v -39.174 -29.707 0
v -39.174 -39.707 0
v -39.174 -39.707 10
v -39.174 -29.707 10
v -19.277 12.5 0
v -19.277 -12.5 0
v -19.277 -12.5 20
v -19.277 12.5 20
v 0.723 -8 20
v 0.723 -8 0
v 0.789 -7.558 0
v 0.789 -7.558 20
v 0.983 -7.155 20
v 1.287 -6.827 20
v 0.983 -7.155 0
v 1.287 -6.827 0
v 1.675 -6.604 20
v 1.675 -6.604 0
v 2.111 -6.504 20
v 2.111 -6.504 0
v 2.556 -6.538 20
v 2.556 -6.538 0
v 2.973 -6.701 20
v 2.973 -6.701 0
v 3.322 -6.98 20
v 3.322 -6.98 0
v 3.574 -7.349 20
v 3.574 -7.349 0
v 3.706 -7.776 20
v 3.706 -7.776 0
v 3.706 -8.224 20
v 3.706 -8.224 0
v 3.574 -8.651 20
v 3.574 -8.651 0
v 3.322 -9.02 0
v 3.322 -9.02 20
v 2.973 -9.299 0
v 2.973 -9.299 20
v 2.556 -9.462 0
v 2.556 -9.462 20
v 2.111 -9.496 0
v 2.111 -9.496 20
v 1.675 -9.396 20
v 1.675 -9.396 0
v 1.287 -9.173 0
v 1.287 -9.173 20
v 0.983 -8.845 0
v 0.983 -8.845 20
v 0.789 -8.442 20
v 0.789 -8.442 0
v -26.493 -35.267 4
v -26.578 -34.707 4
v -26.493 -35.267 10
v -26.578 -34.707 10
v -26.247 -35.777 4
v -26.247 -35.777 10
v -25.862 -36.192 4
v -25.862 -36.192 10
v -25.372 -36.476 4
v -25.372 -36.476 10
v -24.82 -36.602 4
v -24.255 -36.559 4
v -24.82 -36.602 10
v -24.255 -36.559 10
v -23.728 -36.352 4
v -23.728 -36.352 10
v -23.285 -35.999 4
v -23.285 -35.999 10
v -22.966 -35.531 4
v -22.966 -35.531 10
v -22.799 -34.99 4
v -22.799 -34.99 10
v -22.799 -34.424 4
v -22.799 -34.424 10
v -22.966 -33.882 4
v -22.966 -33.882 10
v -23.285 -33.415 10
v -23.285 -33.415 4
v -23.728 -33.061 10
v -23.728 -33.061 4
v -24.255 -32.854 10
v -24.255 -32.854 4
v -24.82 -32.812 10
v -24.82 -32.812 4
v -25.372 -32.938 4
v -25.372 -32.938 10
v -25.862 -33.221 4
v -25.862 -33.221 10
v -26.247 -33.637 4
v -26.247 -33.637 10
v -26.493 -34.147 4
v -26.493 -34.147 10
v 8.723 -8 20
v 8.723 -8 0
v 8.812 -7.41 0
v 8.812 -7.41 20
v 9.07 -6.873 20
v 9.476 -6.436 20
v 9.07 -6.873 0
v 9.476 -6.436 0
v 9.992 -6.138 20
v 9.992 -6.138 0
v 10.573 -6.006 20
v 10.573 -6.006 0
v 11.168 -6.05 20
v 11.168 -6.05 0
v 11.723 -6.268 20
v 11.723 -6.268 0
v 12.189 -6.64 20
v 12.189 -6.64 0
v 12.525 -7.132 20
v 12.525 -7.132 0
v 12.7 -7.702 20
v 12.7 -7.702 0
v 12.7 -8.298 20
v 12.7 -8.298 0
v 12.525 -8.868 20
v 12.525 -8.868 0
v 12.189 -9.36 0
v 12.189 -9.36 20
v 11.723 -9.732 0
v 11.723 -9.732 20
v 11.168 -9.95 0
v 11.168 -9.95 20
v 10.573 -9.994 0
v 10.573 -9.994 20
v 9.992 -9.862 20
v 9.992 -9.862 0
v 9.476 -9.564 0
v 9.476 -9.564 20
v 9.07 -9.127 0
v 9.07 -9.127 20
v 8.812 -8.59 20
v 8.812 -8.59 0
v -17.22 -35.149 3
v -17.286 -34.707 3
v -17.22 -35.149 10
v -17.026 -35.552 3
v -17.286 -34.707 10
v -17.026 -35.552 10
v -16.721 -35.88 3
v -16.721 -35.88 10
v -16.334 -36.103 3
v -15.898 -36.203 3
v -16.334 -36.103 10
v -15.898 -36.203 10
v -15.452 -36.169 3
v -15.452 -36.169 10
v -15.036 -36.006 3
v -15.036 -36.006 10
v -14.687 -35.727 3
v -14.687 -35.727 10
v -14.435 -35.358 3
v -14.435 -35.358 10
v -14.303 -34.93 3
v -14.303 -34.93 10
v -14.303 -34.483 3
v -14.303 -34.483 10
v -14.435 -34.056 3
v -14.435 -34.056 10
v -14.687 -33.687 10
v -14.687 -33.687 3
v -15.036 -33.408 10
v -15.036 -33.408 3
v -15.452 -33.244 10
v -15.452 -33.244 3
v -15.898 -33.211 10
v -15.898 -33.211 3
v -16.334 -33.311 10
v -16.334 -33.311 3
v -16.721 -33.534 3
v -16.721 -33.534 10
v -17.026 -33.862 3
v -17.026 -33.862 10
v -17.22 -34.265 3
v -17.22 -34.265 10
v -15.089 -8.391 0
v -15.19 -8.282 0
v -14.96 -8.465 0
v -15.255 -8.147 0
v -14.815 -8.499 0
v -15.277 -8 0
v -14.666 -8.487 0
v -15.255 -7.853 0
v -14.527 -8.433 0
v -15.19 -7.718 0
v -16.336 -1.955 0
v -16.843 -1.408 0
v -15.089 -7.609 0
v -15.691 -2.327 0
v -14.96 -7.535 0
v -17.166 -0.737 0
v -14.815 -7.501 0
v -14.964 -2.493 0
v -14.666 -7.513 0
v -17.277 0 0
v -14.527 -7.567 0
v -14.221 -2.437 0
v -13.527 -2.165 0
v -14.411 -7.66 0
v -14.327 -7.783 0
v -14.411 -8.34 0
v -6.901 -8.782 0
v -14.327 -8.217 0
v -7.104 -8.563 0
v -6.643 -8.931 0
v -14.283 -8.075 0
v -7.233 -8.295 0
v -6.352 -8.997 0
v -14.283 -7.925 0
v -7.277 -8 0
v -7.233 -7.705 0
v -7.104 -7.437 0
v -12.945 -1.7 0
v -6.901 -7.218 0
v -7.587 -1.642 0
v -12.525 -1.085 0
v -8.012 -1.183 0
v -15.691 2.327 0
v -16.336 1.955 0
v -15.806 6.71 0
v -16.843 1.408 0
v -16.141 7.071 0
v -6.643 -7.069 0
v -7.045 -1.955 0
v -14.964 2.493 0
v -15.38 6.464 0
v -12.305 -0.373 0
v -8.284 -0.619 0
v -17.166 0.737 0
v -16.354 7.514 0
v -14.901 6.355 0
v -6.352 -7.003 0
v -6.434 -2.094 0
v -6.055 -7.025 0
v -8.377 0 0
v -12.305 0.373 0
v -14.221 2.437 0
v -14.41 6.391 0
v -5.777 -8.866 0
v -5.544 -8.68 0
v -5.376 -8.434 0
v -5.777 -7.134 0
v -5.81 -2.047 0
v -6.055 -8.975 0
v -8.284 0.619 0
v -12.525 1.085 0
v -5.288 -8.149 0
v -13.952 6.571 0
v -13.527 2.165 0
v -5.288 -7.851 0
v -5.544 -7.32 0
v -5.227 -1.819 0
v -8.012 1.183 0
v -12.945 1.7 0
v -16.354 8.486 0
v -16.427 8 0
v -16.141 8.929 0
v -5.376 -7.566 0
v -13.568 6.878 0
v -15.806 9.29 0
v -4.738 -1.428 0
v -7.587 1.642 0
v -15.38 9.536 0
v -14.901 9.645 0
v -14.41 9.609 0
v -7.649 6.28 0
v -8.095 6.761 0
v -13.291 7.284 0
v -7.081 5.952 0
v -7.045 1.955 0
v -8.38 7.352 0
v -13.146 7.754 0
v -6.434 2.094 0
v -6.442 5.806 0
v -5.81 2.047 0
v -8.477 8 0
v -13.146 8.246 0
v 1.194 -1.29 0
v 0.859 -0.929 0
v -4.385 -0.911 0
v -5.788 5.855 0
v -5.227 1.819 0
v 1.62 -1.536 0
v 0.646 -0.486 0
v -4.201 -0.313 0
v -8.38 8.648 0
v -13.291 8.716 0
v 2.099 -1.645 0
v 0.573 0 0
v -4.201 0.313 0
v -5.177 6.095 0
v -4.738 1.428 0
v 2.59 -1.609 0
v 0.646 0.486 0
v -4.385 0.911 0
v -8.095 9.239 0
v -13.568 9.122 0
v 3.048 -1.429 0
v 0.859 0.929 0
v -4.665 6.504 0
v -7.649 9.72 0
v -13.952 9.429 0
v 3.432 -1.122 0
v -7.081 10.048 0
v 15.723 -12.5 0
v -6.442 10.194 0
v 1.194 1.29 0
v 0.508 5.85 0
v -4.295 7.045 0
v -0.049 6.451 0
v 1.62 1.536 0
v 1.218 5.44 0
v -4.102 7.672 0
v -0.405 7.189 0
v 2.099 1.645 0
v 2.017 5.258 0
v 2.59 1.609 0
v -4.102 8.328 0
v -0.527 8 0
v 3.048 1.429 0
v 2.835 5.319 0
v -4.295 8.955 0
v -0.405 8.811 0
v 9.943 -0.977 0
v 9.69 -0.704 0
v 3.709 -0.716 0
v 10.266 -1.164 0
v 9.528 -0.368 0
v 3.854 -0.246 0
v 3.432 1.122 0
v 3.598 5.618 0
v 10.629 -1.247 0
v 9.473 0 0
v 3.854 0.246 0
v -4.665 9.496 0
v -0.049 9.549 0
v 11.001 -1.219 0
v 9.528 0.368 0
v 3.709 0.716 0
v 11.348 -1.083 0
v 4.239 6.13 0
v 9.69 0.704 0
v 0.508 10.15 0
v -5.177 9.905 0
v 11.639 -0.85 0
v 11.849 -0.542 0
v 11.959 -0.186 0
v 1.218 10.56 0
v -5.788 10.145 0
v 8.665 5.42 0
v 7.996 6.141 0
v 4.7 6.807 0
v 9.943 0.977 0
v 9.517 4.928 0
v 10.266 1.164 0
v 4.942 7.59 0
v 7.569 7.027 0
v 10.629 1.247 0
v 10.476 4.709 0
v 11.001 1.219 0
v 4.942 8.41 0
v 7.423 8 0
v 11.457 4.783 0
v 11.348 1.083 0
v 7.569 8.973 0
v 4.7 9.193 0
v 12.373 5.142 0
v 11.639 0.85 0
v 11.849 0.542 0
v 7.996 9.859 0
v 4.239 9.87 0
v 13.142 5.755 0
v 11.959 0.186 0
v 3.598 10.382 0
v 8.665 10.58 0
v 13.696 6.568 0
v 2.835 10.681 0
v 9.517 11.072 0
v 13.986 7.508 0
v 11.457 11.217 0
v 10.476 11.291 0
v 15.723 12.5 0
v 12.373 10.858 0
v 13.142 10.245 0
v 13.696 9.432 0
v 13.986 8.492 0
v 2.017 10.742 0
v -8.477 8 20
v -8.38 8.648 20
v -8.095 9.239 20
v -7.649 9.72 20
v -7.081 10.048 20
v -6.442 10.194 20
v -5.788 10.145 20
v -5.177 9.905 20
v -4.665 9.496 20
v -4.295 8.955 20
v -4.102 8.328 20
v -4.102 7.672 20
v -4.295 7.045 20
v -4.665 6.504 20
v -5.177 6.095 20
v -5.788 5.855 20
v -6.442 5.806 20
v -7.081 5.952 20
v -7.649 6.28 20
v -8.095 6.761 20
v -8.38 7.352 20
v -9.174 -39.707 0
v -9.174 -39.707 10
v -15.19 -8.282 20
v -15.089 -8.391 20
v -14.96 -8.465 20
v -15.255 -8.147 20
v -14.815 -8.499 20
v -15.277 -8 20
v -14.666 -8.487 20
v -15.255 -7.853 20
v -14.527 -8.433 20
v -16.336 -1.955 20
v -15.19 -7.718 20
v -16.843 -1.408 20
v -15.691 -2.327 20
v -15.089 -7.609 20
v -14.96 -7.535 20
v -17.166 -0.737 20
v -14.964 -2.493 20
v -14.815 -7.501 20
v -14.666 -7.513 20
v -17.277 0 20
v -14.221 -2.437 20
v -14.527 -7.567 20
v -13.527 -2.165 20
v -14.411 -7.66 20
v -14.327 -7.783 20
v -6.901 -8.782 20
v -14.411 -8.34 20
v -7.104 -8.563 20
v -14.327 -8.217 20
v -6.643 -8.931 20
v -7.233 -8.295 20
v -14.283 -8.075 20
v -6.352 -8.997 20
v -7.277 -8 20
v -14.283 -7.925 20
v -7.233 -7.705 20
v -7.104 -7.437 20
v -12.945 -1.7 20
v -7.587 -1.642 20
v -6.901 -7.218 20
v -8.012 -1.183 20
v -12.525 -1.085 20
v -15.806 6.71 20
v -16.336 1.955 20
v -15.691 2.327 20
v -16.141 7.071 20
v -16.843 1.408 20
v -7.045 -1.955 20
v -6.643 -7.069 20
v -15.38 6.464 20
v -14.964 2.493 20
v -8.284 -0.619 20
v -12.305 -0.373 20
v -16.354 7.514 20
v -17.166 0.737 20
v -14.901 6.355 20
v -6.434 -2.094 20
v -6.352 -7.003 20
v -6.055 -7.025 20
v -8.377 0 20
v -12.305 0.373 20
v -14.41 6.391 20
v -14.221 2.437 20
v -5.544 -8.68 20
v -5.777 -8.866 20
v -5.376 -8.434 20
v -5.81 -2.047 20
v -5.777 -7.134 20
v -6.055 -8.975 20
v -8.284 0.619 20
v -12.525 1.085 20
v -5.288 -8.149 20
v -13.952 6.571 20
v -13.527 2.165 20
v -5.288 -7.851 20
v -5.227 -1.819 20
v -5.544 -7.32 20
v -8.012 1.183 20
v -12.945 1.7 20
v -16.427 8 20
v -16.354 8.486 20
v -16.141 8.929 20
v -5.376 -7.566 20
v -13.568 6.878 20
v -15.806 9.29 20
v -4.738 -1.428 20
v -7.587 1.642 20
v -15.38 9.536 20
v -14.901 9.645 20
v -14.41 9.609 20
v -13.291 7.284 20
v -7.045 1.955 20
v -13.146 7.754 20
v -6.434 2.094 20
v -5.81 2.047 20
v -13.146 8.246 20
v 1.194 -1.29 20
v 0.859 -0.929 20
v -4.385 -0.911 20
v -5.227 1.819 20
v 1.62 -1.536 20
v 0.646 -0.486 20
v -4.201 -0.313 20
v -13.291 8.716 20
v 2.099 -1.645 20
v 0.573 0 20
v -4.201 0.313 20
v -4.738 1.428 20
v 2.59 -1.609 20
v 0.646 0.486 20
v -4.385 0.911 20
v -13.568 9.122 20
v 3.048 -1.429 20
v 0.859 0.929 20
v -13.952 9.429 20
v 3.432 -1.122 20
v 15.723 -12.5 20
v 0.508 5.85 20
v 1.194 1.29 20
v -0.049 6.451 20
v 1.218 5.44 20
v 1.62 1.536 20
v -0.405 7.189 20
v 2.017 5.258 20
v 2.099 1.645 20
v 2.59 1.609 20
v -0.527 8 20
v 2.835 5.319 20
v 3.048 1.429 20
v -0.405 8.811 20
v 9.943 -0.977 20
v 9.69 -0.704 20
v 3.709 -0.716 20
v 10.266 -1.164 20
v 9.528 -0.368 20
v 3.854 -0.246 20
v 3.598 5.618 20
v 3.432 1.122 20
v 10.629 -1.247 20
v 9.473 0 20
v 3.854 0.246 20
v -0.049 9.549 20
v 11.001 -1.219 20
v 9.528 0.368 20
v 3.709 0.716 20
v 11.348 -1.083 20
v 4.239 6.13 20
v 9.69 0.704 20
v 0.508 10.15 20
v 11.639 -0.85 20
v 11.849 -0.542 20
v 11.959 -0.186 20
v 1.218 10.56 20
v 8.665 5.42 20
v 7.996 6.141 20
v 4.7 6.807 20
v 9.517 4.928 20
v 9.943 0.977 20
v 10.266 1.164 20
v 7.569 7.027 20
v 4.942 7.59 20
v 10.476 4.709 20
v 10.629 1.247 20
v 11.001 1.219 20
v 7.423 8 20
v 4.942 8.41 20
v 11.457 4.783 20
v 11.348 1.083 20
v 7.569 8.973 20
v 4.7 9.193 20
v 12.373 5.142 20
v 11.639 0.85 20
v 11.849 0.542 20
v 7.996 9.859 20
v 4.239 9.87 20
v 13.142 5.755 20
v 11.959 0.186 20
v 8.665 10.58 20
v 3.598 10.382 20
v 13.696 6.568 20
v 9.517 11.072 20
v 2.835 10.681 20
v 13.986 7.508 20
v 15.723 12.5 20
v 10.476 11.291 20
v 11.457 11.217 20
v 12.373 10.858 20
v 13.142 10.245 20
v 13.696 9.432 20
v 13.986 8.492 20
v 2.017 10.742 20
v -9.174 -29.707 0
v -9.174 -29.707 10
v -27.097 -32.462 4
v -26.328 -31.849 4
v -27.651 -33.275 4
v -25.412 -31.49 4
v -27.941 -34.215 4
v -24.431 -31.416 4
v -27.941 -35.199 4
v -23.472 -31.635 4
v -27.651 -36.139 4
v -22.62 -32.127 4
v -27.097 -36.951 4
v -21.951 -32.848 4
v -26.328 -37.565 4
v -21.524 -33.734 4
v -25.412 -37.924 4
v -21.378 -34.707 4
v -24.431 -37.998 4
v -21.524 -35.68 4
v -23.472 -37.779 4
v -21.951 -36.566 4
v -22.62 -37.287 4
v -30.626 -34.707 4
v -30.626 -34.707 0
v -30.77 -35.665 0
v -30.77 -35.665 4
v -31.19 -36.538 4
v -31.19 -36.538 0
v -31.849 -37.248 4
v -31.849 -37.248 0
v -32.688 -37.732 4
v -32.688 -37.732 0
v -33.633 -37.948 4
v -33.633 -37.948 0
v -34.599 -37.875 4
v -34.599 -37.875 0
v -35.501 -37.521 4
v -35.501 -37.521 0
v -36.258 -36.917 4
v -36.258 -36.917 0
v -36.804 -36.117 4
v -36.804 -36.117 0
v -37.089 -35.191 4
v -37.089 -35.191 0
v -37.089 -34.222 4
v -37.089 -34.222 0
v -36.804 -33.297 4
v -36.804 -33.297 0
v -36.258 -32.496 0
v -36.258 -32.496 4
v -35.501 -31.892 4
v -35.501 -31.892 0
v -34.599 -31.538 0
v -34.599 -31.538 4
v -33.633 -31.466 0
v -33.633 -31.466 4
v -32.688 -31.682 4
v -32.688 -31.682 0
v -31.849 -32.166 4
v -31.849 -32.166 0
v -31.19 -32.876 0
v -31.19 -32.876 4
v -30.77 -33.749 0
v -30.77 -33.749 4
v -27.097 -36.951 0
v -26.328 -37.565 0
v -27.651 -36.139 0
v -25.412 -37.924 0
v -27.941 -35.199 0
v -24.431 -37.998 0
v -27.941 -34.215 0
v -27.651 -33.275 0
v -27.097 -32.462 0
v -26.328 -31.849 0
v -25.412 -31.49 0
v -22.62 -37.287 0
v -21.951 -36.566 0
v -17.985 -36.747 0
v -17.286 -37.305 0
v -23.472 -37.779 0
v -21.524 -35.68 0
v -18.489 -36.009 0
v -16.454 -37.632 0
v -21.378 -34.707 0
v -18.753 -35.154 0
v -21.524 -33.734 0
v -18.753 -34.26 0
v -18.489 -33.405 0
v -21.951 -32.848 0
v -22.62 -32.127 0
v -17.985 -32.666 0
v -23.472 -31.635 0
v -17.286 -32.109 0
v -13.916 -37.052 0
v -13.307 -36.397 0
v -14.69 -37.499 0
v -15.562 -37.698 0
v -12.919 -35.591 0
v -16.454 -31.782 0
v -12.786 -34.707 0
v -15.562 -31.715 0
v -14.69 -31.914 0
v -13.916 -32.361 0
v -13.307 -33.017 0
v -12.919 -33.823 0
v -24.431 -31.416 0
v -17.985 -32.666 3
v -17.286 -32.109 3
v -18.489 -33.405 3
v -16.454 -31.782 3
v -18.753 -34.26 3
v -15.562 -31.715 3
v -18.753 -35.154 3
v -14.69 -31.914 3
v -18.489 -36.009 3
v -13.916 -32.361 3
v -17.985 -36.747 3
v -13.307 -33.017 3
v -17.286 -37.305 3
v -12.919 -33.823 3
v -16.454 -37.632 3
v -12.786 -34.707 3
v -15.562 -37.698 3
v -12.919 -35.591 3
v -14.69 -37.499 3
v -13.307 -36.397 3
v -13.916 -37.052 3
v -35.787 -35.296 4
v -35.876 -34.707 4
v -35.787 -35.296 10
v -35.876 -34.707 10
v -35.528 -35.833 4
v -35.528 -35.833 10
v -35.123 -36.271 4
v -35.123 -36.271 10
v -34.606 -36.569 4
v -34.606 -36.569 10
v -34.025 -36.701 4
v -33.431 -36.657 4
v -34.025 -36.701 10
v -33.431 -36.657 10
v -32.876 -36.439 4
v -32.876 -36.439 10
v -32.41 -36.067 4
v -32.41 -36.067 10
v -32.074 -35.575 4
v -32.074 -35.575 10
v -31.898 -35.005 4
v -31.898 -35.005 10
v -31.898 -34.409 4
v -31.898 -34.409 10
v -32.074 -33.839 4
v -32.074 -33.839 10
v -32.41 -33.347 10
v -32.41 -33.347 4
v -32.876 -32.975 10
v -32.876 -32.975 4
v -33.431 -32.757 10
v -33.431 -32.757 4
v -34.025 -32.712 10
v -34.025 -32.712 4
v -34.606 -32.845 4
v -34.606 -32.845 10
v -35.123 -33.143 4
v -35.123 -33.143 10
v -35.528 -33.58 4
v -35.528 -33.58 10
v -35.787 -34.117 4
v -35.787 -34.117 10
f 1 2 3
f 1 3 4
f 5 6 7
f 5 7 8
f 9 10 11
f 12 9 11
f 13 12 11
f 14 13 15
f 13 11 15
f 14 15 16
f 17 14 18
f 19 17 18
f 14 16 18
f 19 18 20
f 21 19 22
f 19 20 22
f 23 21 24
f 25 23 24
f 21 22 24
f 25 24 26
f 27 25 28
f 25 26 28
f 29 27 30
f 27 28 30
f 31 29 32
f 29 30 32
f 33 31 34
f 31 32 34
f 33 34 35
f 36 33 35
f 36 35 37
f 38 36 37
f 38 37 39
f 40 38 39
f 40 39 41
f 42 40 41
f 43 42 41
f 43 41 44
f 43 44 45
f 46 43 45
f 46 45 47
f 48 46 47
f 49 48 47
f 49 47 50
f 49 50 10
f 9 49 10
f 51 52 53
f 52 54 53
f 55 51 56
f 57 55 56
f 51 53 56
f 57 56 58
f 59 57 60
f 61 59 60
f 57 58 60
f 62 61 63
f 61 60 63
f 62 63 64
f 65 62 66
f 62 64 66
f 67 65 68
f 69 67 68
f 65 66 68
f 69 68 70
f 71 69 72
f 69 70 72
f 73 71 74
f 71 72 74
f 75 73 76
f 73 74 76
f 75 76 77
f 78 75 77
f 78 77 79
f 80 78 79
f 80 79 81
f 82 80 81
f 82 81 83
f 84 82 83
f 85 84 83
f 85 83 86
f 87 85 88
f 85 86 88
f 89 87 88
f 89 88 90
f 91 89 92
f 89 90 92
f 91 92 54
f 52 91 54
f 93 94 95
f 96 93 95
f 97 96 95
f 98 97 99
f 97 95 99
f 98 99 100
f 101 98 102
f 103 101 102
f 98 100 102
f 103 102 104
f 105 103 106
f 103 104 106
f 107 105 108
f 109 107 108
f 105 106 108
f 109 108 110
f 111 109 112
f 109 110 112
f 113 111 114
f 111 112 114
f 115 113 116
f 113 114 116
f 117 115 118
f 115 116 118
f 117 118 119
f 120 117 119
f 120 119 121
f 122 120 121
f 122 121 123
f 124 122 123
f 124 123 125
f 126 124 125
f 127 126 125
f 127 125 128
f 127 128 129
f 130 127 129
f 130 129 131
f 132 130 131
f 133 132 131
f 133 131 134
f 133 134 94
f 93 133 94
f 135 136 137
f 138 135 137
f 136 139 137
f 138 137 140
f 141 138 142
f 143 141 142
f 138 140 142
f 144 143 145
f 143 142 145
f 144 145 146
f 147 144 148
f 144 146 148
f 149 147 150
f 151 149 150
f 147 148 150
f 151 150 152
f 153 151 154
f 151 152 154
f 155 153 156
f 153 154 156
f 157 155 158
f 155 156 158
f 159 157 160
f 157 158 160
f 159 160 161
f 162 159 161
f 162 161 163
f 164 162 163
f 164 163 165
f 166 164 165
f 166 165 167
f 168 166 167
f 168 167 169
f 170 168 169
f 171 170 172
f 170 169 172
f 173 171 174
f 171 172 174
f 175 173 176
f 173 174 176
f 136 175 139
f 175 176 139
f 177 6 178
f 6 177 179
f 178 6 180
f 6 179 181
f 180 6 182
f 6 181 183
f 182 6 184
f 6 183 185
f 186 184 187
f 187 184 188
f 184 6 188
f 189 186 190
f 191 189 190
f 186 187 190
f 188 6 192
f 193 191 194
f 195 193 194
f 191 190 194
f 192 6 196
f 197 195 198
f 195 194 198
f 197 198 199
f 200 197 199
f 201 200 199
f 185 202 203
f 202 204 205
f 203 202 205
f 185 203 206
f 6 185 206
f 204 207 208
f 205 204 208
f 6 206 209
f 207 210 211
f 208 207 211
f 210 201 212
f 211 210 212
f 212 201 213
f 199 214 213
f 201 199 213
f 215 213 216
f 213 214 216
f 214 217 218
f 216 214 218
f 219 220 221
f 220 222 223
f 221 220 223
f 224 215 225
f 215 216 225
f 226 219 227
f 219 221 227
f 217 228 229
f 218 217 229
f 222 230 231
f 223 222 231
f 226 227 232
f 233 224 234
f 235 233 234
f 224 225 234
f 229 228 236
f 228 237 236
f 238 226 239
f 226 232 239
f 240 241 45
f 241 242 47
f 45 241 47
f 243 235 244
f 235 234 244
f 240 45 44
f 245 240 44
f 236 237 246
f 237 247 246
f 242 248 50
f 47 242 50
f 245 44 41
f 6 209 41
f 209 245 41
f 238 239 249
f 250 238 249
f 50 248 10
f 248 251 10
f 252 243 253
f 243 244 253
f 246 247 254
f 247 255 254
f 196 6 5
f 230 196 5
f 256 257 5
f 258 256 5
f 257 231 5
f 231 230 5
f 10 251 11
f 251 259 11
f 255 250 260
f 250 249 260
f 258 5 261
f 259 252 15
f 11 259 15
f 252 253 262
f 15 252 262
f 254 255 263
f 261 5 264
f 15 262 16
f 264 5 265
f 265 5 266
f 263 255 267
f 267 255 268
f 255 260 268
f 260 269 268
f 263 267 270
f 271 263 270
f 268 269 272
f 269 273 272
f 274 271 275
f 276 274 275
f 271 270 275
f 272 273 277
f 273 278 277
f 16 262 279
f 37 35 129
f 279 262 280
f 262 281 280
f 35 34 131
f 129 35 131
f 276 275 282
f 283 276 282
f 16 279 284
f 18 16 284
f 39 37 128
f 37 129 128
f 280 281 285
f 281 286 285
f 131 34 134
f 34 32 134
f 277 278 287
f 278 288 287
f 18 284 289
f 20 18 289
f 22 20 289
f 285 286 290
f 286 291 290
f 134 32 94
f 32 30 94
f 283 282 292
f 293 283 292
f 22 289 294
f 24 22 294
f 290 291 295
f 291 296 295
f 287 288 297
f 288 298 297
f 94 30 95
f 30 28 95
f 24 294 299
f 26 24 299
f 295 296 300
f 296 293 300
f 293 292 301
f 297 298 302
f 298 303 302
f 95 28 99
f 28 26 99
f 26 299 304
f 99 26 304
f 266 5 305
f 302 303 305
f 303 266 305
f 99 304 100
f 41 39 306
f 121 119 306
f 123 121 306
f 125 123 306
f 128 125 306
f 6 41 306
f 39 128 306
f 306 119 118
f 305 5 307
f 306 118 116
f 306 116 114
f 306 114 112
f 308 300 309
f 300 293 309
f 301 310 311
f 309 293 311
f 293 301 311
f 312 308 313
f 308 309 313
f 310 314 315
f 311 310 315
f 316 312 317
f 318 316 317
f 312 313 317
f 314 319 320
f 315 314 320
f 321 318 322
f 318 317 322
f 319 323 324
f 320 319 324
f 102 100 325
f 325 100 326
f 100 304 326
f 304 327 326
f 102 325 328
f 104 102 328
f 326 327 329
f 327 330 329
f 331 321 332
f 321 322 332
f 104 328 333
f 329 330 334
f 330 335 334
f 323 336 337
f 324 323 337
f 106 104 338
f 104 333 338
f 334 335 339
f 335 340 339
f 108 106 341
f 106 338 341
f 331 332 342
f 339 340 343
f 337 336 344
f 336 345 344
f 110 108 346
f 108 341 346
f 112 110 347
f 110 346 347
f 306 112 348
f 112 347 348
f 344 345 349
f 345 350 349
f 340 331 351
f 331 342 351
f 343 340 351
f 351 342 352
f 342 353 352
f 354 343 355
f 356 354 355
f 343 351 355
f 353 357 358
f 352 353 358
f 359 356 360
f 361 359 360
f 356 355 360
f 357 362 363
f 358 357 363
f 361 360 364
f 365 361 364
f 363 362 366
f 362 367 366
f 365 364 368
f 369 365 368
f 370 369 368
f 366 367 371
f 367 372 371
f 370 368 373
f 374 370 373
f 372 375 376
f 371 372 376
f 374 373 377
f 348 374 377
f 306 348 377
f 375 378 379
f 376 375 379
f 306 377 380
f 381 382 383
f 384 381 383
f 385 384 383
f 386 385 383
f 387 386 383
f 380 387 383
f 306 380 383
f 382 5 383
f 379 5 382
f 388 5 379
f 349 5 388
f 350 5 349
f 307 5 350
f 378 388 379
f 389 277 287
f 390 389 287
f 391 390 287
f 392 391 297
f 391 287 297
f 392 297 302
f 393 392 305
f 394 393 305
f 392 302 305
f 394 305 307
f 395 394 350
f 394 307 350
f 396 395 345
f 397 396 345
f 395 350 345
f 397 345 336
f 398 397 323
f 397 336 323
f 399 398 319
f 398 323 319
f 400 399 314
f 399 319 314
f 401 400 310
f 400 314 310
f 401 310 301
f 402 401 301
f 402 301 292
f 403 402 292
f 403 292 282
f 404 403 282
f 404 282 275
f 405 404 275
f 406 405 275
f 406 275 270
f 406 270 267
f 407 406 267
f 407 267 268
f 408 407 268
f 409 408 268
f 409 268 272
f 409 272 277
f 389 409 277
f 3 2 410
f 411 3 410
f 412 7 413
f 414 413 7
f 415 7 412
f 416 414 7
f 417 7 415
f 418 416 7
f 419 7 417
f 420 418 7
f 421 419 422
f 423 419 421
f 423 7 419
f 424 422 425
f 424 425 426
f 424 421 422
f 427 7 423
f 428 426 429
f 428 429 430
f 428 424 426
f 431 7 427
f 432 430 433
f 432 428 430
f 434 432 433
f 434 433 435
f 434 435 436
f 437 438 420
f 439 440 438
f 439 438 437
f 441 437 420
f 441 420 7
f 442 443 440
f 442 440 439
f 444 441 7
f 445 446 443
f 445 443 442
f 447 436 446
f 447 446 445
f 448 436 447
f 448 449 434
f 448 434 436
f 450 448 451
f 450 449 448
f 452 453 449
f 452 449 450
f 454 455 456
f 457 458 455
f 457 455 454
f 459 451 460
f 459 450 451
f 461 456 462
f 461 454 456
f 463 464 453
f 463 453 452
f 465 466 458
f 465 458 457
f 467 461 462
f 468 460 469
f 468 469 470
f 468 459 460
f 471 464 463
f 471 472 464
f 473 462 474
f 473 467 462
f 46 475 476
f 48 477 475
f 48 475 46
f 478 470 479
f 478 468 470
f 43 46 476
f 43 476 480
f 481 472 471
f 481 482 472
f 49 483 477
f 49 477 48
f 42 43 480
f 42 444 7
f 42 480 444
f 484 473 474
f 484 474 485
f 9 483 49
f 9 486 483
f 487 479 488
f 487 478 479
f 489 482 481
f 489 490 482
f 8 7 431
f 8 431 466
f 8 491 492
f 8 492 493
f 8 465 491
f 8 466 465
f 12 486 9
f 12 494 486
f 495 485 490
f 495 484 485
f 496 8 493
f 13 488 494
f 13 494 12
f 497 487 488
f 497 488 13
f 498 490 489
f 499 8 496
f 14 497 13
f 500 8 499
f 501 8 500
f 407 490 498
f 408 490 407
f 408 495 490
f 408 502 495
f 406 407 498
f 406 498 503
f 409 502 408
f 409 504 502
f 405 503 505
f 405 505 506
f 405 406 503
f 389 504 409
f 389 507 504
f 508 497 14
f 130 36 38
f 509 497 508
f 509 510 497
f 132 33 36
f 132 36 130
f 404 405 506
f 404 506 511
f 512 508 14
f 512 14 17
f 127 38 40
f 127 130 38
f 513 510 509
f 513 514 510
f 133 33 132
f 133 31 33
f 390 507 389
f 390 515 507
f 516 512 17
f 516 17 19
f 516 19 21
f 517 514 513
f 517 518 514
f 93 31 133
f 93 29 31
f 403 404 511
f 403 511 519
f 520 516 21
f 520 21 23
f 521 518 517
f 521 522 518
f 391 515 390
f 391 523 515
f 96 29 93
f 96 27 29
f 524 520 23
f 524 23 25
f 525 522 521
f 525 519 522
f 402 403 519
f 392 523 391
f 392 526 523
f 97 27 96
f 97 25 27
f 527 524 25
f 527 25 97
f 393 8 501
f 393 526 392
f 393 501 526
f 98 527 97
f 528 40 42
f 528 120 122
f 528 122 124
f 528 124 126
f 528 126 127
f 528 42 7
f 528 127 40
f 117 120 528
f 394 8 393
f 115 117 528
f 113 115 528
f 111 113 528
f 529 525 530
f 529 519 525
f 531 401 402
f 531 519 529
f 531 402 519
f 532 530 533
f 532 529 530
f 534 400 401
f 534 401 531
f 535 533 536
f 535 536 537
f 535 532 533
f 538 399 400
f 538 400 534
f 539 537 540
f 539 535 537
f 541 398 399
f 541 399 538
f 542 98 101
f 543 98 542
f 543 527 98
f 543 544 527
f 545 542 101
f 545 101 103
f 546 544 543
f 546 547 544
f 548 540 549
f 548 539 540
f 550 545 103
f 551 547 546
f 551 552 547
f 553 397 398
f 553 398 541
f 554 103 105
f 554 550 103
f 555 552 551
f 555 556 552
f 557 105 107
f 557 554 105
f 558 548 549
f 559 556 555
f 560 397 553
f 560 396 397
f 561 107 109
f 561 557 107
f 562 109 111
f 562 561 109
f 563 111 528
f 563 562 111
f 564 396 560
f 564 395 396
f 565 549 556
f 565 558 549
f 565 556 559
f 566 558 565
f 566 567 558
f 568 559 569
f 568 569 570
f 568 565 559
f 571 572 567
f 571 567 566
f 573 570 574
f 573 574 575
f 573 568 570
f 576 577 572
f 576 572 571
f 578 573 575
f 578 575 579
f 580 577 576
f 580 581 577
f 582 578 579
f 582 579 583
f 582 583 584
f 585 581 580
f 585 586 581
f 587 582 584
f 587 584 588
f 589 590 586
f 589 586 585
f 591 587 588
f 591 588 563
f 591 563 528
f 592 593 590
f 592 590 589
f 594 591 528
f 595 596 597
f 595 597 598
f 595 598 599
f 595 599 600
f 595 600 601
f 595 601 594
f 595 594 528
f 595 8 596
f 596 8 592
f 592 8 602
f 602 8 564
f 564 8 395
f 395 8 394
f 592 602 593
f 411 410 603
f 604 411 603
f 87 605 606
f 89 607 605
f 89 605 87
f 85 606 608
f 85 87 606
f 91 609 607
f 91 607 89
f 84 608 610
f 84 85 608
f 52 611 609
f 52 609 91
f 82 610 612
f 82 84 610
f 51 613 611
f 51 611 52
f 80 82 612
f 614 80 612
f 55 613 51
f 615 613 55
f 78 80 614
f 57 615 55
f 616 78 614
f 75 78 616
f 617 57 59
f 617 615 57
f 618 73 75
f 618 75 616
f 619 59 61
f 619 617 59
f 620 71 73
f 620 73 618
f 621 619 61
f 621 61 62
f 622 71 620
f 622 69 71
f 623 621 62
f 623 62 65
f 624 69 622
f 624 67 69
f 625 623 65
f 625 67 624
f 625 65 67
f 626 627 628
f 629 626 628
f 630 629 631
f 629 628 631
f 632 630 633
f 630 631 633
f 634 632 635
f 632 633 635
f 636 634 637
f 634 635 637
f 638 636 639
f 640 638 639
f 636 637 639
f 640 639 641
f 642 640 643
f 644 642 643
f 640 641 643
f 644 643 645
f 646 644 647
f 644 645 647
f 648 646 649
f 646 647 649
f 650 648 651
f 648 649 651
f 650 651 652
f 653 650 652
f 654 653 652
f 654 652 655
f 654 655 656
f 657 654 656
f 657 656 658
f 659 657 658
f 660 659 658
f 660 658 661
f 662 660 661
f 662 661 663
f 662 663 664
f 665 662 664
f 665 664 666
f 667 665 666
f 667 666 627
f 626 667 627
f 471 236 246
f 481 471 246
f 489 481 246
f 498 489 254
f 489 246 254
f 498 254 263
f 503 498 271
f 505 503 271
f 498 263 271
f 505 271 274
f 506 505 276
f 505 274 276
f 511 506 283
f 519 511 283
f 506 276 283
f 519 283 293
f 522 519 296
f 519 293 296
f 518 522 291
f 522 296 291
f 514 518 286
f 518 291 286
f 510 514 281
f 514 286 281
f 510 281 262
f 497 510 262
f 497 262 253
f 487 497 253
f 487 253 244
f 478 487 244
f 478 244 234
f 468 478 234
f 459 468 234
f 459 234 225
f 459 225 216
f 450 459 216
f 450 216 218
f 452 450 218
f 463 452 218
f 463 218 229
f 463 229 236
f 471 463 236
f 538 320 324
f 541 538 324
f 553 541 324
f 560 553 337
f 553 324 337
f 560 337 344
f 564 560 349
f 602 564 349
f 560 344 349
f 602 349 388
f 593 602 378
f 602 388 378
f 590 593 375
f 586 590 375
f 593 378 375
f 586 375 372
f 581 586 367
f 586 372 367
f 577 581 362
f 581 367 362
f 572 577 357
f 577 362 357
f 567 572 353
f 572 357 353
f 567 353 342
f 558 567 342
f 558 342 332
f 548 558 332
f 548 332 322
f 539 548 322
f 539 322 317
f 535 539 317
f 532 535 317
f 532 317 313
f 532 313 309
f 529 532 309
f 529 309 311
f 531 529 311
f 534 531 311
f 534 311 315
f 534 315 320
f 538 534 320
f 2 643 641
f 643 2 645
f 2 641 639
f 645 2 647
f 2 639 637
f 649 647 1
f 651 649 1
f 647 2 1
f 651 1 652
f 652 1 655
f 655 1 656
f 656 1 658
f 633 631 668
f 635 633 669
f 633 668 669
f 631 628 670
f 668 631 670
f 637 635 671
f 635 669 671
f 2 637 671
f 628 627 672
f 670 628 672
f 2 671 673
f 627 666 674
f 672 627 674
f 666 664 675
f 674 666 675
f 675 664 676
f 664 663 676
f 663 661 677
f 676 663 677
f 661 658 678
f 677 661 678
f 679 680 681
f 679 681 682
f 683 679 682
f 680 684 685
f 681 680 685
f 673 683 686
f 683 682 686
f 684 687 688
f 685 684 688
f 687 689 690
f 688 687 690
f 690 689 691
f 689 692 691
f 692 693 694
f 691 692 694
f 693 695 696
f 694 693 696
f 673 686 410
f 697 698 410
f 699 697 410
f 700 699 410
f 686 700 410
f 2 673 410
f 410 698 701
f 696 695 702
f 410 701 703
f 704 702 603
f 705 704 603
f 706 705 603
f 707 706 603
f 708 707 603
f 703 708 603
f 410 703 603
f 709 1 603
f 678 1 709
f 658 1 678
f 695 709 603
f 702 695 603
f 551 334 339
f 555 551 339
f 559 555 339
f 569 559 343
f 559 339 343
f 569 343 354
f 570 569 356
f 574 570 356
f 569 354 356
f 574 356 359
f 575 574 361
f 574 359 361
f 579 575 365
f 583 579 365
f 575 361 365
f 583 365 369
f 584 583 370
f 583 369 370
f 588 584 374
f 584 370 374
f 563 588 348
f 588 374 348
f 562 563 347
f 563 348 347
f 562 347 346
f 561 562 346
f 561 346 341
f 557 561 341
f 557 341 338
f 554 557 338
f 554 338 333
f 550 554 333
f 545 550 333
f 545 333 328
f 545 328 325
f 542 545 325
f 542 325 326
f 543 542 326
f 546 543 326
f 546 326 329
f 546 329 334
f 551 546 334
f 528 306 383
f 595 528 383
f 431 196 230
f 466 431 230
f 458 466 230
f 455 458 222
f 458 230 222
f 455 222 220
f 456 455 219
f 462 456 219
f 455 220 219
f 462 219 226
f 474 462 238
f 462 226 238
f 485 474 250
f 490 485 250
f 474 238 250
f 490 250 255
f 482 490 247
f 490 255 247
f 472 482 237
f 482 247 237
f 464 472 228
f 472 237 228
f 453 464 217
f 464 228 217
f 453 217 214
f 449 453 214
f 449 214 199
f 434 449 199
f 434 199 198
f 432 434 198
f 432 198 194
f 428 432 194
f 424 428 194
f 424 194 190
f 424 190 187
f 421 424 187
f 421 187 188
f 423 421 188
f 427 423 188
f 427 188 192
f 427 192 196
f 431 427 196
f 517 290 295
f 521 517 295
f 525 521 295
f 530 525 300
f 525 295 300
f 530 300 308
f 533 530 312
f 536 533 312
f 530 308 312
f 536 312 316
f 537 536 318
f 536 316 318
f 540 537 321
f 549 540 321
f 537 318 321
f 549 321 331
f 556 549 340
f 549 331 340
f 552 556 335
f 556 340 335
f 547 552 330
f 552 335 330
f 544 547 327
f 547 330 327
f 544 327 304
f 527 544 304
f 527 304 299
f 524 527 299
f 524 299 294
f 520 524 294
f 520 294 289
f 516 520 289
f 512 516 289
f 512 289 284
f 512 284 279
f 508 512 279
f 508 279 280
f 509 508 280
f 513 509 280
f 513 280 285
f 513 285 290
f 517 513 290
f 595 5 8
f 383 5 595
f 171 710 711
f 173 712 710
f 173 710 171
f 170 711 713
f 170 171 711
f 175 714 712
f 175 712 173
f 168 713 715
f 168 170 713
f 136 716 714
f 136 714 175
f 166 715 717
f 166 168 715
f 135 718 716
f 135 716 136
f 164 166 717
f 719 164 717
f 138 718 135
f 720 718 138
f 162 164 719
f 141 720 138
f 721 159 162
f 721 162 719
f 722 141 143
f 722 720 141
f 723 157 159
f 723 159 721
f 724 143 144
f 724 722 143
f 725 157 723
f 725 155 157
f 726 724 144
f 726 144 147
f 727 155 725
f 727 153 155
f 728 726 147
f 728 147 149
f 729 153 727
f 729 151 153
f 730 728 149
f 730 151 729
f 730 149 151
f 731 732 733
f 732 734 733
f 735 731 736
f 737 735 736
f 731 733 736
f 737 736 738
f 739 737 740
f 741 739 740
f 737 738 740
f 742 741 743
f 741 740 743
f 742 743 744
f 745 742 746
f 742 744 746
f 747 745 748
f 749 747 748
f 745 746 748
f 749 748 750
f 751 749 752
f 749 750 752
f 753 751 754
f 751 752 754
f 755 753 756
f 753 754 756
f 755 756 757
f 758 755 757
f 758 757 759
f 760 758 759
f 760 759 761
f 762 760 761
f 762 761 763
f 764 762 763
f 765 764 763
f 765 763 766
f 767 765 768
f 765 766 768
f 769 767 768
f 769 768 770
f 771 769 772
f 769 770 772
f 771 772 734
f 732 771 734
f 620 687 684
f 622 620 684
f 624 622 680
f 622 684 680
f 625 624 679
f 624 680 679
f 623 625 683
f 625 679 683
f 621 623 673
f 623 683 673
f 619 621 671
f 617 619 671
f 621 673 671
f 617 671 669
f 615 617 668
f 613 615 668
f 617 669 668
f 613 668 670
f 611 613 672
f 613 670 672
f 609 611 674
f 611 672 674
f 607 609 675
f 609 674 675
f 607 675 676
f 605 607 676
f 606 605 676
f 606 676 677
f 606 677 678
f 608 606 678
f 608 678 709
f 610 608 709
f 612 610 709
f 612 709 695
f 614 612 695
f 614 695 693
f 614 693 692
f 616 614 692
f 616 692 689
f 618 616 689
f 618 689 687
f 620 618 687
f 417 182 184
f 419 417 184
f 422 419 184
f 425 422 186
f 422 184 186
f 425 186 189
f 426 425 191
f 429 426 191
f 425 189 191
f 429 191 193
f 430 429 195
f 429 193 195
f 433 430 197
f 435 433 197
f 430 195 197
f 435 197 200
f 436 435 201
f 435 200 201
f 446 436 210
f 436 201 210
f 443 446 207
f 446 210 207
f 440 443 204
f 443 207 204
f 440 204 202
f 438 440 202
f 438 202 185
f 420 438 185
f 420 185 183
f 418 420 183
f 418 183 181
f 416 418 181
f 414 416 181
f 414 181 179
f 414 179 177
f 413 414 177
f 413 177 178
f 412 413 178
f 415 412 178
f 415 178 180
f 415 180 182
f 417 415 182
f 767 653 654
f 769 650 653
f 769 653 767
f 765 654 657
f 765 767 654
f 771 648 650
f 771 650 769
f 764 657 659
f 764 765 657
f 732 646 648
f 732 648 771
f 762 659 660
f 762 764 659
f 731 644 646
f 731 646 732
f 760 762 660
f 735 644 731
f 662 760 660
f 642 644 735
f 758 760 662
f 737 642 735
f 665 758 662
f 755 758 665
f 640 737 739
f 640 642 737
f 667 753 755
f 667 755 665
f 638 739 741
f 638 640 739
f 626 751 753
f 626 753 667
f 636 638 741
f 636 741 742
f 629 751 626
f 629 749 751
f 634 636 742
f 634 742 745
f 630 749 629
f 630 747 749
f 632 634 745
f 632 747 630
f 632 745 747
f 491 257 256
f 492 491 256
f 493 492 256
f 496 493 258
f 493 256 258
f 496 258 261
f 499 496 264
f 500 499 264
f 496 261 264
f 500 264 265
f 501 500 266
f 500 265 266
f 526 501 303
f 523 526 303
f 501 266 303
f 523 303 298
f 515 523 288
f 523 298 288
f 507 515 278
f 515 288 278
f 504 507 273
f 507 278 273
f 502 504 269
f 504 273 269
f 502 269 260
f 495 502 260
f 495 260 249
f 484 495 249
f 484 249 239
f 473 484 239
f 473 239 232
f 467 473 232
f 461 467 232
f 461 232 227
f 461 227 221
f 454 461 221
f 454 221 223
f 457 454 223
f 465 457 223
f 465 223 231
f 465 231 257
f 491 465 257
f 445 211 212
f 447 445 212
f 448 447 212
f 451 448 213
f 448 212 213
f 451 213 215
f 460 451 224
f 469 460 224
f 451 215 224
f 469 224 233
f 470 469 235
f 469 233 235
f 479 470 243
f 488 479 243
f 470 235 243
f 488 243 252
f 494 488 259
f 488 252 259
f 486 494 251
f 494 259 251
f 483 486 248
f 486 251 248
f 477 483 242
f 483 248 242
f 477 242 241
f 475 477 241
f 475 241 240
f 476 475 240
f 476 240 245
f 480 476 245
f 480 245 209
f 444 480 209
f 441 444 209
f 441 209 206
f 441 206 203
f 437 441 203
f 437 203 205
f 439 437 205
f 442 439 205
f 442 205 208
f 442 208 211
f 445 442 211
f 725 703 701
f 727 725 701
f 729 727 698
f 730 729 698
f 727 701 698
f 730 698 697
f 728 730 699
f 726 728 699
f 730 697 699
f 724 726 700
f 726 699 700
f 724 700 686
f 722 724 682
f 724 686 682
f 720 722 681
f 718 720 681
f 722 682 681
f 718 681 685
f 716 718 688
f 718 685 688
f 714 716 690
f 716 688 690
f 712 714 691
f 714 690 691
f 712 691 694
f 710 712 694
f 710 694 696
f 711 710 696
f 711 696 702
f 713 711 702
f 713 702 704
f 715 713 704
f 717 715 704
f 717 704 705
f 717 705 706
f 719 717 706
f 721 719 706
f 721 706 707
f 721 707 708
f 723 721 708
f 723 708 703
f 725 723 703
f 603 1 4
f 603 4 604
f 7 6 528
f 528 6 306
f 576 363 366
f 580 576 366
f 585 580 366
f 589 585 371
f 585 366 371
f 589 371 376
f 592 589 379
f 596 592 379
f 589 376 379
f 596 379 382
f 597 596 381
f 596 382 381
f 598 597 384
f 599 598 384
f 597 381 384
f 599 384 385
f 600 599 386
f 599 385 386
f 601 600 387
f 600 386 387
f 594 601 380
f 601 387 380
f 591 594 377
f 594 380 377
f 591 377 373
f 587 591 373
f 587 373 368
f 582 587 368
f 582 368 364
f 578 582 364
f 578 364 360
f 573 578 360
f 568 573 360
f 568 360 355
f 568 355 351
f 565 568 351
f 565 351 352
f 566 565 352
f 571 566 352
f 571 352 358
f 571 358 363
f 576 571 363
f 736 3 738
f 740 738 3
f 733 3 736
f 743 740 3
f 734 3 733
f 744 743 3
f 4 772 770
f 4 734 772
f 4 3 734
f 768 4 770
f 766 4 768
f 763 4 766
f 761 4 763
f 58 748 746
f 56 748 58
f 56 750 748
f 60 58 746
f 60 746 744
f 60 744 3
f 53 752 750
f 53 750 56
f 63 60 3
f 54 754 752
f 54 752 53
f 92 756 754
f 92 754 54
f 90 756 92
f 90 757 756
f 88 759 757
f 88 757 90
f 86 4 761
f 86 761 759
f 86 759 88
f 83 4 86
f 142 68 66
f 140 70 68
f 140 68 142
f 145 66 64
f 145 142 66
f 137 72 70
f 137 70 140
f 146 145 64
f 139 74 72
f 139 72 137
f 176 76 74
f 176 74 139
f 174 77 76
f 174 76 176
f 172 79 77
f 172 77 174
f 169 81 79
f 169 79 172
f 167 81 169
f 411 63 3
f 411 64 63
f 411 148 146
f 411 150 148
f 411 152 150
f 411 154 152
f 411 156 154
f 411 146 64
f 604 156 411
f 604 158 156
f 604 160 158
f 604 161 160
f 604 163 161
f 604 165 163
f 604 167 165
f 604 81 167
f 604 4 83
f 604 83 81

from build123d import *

# Parameters (mm, degrees)
F0_W            = 35
F0_H            = 25
F1_DEPTH        = 20
F3_D            = 3.3
F4_D            = 4.4
F5_D            = 5.5
F6_D            = 6.6
F7_D            = 5
F8_D            = 4.2
F9_D            = 3.3
F10_D           = 2.5
F11_D           = 1
F12_D           = 2
F13_D           = 3
F14_D           = 4
F15_W           = 30
F15_H           = 10
F16_DEPTH       = 10
F17_D           = 4
F17_CBORE_D     = 6.5
F17_CBORE_DEPTH = 4
F18_D           = 3.8
F18_CBORE_D     = 6.6
F18_CBORE_DEPTH = 4
F19_D           = 3
F19_CBORE_D     = 6
F19_CBORE_DEPTH = 3


with BuildPart() as f1:
    # F0 (on Top) → F1 (new body)
    with BuildSketch(Plane.XY):
        with Locations((-1.7773216218, 0)):
            Rectangle(F0_W, F0_H)
    extrude(amount=F1_DEPTH)

    # F3 (through all)
    with Locations(Plane.XY.offset(20)):
        with Locations((-14.7773216218, 8)):
            Hole(F3_D / 2)

    # F4 (through all)
    with Locations(Plane.XY.offset(20)):
        with Locations((-6.2773216218, 8)):
            Hole(F4_D / 2)

    # F5 (through all)
    with Locations(Plane.XY.offset(20)):
        with Locations((2.2226783782, 8)):
            Hole(F5_D / 2)

    # F6 (through all)
    with Locations(Plane.XY.offset(20)):
        with Locations((10.7226783782, 8)):
            Hole(F6_D / 2)

    # F7 (through all)
    with Locations(Plane.XY.offset(20)):
        with Locations((-14.7773216218, 0)):
            Hole(F7_D / 2)

    # F8 (through all)
    with Locations(Plane.XY.offset(20)):
        with Locations((-6.2773216218, 0)):
            Hole(F8_D / 2)

    # F9 (through all)
    with Locations(Plane.XY.offset(20)):
        with Locations((2.2226783782, 0)):
            Hole(F9_D / 2)

    # F10 (through all)
    with Locations(Plane.XY.offset(20)):
        with Locations((10.7226783782, 0)):
            Hole(F10_D / 2)

    # F11 (through all)
    with Locations(Plane.XY.offset(20)):
        with Locations((-14.7773216218, -8)):
            Hole(F11_D / 2)

    # F12 (through all)
    with Locations(Plane.XY.offset(20)):
        with Locations((-6.2773216218, -8)):
            Hole(F12_D / 2)

    # F13 (through all)
    with Locations(Plane.XY.offset(20)):
        with Locations((2.2226783782, -8)):
            Hole(F13_D / 2)

    # F14 (through all)
    with Locations(Plane.XY.offset(20)):
        with Locations((10.7226783782, -8)):
            Hole(F14_D / 2)


with BuildPart() as f16:
    # F15 (on Top) → F16 (new body)
    with BuildSketch(Plane.XY):
        with Locations((-24.1738305241, -34.7068560123)):
            Rectangle(F15_W, F15_H)
    extrude(amount=F16_DEPTH)

    # F17 (through all)
    with Locations(Plane(origin=(0, 0, 0), x_dir=(1, 0, 0), z_dir=(0, 0, -1))):
        with Locations((-33.8757373393, 34.7068560123)):
            CounterBoreHole(F17_D / 2, F17_CBORE_D / 2, F17_CBORE_DEPTH)

    # F18 (through all)
    with Locations(Plane(origin=(0, 0, 0), x_dir=(1, 0, 0), z_dir=(0, 0, -1))):
        with Locations((-24.6776435524, 34.7068560123)):
            CounterBoreHole(F18_D / 2, F18_CBORE_D / 2, F18_CBORE_DEPTH)

    # F19 (through all)
    with Locations(Plane(origin=(0, 0, 0), x_dir=(1, 0, 0), z_dir=(0, 0, -1))):
        with Locations((-15.7861541957, 34.7068560123)):
            CounterBoreHole(F19_D / 2, F19_CBORE_D / 2, F19_CBORE_DEPTH)


solid = Compound([f1.part, f16.part])
